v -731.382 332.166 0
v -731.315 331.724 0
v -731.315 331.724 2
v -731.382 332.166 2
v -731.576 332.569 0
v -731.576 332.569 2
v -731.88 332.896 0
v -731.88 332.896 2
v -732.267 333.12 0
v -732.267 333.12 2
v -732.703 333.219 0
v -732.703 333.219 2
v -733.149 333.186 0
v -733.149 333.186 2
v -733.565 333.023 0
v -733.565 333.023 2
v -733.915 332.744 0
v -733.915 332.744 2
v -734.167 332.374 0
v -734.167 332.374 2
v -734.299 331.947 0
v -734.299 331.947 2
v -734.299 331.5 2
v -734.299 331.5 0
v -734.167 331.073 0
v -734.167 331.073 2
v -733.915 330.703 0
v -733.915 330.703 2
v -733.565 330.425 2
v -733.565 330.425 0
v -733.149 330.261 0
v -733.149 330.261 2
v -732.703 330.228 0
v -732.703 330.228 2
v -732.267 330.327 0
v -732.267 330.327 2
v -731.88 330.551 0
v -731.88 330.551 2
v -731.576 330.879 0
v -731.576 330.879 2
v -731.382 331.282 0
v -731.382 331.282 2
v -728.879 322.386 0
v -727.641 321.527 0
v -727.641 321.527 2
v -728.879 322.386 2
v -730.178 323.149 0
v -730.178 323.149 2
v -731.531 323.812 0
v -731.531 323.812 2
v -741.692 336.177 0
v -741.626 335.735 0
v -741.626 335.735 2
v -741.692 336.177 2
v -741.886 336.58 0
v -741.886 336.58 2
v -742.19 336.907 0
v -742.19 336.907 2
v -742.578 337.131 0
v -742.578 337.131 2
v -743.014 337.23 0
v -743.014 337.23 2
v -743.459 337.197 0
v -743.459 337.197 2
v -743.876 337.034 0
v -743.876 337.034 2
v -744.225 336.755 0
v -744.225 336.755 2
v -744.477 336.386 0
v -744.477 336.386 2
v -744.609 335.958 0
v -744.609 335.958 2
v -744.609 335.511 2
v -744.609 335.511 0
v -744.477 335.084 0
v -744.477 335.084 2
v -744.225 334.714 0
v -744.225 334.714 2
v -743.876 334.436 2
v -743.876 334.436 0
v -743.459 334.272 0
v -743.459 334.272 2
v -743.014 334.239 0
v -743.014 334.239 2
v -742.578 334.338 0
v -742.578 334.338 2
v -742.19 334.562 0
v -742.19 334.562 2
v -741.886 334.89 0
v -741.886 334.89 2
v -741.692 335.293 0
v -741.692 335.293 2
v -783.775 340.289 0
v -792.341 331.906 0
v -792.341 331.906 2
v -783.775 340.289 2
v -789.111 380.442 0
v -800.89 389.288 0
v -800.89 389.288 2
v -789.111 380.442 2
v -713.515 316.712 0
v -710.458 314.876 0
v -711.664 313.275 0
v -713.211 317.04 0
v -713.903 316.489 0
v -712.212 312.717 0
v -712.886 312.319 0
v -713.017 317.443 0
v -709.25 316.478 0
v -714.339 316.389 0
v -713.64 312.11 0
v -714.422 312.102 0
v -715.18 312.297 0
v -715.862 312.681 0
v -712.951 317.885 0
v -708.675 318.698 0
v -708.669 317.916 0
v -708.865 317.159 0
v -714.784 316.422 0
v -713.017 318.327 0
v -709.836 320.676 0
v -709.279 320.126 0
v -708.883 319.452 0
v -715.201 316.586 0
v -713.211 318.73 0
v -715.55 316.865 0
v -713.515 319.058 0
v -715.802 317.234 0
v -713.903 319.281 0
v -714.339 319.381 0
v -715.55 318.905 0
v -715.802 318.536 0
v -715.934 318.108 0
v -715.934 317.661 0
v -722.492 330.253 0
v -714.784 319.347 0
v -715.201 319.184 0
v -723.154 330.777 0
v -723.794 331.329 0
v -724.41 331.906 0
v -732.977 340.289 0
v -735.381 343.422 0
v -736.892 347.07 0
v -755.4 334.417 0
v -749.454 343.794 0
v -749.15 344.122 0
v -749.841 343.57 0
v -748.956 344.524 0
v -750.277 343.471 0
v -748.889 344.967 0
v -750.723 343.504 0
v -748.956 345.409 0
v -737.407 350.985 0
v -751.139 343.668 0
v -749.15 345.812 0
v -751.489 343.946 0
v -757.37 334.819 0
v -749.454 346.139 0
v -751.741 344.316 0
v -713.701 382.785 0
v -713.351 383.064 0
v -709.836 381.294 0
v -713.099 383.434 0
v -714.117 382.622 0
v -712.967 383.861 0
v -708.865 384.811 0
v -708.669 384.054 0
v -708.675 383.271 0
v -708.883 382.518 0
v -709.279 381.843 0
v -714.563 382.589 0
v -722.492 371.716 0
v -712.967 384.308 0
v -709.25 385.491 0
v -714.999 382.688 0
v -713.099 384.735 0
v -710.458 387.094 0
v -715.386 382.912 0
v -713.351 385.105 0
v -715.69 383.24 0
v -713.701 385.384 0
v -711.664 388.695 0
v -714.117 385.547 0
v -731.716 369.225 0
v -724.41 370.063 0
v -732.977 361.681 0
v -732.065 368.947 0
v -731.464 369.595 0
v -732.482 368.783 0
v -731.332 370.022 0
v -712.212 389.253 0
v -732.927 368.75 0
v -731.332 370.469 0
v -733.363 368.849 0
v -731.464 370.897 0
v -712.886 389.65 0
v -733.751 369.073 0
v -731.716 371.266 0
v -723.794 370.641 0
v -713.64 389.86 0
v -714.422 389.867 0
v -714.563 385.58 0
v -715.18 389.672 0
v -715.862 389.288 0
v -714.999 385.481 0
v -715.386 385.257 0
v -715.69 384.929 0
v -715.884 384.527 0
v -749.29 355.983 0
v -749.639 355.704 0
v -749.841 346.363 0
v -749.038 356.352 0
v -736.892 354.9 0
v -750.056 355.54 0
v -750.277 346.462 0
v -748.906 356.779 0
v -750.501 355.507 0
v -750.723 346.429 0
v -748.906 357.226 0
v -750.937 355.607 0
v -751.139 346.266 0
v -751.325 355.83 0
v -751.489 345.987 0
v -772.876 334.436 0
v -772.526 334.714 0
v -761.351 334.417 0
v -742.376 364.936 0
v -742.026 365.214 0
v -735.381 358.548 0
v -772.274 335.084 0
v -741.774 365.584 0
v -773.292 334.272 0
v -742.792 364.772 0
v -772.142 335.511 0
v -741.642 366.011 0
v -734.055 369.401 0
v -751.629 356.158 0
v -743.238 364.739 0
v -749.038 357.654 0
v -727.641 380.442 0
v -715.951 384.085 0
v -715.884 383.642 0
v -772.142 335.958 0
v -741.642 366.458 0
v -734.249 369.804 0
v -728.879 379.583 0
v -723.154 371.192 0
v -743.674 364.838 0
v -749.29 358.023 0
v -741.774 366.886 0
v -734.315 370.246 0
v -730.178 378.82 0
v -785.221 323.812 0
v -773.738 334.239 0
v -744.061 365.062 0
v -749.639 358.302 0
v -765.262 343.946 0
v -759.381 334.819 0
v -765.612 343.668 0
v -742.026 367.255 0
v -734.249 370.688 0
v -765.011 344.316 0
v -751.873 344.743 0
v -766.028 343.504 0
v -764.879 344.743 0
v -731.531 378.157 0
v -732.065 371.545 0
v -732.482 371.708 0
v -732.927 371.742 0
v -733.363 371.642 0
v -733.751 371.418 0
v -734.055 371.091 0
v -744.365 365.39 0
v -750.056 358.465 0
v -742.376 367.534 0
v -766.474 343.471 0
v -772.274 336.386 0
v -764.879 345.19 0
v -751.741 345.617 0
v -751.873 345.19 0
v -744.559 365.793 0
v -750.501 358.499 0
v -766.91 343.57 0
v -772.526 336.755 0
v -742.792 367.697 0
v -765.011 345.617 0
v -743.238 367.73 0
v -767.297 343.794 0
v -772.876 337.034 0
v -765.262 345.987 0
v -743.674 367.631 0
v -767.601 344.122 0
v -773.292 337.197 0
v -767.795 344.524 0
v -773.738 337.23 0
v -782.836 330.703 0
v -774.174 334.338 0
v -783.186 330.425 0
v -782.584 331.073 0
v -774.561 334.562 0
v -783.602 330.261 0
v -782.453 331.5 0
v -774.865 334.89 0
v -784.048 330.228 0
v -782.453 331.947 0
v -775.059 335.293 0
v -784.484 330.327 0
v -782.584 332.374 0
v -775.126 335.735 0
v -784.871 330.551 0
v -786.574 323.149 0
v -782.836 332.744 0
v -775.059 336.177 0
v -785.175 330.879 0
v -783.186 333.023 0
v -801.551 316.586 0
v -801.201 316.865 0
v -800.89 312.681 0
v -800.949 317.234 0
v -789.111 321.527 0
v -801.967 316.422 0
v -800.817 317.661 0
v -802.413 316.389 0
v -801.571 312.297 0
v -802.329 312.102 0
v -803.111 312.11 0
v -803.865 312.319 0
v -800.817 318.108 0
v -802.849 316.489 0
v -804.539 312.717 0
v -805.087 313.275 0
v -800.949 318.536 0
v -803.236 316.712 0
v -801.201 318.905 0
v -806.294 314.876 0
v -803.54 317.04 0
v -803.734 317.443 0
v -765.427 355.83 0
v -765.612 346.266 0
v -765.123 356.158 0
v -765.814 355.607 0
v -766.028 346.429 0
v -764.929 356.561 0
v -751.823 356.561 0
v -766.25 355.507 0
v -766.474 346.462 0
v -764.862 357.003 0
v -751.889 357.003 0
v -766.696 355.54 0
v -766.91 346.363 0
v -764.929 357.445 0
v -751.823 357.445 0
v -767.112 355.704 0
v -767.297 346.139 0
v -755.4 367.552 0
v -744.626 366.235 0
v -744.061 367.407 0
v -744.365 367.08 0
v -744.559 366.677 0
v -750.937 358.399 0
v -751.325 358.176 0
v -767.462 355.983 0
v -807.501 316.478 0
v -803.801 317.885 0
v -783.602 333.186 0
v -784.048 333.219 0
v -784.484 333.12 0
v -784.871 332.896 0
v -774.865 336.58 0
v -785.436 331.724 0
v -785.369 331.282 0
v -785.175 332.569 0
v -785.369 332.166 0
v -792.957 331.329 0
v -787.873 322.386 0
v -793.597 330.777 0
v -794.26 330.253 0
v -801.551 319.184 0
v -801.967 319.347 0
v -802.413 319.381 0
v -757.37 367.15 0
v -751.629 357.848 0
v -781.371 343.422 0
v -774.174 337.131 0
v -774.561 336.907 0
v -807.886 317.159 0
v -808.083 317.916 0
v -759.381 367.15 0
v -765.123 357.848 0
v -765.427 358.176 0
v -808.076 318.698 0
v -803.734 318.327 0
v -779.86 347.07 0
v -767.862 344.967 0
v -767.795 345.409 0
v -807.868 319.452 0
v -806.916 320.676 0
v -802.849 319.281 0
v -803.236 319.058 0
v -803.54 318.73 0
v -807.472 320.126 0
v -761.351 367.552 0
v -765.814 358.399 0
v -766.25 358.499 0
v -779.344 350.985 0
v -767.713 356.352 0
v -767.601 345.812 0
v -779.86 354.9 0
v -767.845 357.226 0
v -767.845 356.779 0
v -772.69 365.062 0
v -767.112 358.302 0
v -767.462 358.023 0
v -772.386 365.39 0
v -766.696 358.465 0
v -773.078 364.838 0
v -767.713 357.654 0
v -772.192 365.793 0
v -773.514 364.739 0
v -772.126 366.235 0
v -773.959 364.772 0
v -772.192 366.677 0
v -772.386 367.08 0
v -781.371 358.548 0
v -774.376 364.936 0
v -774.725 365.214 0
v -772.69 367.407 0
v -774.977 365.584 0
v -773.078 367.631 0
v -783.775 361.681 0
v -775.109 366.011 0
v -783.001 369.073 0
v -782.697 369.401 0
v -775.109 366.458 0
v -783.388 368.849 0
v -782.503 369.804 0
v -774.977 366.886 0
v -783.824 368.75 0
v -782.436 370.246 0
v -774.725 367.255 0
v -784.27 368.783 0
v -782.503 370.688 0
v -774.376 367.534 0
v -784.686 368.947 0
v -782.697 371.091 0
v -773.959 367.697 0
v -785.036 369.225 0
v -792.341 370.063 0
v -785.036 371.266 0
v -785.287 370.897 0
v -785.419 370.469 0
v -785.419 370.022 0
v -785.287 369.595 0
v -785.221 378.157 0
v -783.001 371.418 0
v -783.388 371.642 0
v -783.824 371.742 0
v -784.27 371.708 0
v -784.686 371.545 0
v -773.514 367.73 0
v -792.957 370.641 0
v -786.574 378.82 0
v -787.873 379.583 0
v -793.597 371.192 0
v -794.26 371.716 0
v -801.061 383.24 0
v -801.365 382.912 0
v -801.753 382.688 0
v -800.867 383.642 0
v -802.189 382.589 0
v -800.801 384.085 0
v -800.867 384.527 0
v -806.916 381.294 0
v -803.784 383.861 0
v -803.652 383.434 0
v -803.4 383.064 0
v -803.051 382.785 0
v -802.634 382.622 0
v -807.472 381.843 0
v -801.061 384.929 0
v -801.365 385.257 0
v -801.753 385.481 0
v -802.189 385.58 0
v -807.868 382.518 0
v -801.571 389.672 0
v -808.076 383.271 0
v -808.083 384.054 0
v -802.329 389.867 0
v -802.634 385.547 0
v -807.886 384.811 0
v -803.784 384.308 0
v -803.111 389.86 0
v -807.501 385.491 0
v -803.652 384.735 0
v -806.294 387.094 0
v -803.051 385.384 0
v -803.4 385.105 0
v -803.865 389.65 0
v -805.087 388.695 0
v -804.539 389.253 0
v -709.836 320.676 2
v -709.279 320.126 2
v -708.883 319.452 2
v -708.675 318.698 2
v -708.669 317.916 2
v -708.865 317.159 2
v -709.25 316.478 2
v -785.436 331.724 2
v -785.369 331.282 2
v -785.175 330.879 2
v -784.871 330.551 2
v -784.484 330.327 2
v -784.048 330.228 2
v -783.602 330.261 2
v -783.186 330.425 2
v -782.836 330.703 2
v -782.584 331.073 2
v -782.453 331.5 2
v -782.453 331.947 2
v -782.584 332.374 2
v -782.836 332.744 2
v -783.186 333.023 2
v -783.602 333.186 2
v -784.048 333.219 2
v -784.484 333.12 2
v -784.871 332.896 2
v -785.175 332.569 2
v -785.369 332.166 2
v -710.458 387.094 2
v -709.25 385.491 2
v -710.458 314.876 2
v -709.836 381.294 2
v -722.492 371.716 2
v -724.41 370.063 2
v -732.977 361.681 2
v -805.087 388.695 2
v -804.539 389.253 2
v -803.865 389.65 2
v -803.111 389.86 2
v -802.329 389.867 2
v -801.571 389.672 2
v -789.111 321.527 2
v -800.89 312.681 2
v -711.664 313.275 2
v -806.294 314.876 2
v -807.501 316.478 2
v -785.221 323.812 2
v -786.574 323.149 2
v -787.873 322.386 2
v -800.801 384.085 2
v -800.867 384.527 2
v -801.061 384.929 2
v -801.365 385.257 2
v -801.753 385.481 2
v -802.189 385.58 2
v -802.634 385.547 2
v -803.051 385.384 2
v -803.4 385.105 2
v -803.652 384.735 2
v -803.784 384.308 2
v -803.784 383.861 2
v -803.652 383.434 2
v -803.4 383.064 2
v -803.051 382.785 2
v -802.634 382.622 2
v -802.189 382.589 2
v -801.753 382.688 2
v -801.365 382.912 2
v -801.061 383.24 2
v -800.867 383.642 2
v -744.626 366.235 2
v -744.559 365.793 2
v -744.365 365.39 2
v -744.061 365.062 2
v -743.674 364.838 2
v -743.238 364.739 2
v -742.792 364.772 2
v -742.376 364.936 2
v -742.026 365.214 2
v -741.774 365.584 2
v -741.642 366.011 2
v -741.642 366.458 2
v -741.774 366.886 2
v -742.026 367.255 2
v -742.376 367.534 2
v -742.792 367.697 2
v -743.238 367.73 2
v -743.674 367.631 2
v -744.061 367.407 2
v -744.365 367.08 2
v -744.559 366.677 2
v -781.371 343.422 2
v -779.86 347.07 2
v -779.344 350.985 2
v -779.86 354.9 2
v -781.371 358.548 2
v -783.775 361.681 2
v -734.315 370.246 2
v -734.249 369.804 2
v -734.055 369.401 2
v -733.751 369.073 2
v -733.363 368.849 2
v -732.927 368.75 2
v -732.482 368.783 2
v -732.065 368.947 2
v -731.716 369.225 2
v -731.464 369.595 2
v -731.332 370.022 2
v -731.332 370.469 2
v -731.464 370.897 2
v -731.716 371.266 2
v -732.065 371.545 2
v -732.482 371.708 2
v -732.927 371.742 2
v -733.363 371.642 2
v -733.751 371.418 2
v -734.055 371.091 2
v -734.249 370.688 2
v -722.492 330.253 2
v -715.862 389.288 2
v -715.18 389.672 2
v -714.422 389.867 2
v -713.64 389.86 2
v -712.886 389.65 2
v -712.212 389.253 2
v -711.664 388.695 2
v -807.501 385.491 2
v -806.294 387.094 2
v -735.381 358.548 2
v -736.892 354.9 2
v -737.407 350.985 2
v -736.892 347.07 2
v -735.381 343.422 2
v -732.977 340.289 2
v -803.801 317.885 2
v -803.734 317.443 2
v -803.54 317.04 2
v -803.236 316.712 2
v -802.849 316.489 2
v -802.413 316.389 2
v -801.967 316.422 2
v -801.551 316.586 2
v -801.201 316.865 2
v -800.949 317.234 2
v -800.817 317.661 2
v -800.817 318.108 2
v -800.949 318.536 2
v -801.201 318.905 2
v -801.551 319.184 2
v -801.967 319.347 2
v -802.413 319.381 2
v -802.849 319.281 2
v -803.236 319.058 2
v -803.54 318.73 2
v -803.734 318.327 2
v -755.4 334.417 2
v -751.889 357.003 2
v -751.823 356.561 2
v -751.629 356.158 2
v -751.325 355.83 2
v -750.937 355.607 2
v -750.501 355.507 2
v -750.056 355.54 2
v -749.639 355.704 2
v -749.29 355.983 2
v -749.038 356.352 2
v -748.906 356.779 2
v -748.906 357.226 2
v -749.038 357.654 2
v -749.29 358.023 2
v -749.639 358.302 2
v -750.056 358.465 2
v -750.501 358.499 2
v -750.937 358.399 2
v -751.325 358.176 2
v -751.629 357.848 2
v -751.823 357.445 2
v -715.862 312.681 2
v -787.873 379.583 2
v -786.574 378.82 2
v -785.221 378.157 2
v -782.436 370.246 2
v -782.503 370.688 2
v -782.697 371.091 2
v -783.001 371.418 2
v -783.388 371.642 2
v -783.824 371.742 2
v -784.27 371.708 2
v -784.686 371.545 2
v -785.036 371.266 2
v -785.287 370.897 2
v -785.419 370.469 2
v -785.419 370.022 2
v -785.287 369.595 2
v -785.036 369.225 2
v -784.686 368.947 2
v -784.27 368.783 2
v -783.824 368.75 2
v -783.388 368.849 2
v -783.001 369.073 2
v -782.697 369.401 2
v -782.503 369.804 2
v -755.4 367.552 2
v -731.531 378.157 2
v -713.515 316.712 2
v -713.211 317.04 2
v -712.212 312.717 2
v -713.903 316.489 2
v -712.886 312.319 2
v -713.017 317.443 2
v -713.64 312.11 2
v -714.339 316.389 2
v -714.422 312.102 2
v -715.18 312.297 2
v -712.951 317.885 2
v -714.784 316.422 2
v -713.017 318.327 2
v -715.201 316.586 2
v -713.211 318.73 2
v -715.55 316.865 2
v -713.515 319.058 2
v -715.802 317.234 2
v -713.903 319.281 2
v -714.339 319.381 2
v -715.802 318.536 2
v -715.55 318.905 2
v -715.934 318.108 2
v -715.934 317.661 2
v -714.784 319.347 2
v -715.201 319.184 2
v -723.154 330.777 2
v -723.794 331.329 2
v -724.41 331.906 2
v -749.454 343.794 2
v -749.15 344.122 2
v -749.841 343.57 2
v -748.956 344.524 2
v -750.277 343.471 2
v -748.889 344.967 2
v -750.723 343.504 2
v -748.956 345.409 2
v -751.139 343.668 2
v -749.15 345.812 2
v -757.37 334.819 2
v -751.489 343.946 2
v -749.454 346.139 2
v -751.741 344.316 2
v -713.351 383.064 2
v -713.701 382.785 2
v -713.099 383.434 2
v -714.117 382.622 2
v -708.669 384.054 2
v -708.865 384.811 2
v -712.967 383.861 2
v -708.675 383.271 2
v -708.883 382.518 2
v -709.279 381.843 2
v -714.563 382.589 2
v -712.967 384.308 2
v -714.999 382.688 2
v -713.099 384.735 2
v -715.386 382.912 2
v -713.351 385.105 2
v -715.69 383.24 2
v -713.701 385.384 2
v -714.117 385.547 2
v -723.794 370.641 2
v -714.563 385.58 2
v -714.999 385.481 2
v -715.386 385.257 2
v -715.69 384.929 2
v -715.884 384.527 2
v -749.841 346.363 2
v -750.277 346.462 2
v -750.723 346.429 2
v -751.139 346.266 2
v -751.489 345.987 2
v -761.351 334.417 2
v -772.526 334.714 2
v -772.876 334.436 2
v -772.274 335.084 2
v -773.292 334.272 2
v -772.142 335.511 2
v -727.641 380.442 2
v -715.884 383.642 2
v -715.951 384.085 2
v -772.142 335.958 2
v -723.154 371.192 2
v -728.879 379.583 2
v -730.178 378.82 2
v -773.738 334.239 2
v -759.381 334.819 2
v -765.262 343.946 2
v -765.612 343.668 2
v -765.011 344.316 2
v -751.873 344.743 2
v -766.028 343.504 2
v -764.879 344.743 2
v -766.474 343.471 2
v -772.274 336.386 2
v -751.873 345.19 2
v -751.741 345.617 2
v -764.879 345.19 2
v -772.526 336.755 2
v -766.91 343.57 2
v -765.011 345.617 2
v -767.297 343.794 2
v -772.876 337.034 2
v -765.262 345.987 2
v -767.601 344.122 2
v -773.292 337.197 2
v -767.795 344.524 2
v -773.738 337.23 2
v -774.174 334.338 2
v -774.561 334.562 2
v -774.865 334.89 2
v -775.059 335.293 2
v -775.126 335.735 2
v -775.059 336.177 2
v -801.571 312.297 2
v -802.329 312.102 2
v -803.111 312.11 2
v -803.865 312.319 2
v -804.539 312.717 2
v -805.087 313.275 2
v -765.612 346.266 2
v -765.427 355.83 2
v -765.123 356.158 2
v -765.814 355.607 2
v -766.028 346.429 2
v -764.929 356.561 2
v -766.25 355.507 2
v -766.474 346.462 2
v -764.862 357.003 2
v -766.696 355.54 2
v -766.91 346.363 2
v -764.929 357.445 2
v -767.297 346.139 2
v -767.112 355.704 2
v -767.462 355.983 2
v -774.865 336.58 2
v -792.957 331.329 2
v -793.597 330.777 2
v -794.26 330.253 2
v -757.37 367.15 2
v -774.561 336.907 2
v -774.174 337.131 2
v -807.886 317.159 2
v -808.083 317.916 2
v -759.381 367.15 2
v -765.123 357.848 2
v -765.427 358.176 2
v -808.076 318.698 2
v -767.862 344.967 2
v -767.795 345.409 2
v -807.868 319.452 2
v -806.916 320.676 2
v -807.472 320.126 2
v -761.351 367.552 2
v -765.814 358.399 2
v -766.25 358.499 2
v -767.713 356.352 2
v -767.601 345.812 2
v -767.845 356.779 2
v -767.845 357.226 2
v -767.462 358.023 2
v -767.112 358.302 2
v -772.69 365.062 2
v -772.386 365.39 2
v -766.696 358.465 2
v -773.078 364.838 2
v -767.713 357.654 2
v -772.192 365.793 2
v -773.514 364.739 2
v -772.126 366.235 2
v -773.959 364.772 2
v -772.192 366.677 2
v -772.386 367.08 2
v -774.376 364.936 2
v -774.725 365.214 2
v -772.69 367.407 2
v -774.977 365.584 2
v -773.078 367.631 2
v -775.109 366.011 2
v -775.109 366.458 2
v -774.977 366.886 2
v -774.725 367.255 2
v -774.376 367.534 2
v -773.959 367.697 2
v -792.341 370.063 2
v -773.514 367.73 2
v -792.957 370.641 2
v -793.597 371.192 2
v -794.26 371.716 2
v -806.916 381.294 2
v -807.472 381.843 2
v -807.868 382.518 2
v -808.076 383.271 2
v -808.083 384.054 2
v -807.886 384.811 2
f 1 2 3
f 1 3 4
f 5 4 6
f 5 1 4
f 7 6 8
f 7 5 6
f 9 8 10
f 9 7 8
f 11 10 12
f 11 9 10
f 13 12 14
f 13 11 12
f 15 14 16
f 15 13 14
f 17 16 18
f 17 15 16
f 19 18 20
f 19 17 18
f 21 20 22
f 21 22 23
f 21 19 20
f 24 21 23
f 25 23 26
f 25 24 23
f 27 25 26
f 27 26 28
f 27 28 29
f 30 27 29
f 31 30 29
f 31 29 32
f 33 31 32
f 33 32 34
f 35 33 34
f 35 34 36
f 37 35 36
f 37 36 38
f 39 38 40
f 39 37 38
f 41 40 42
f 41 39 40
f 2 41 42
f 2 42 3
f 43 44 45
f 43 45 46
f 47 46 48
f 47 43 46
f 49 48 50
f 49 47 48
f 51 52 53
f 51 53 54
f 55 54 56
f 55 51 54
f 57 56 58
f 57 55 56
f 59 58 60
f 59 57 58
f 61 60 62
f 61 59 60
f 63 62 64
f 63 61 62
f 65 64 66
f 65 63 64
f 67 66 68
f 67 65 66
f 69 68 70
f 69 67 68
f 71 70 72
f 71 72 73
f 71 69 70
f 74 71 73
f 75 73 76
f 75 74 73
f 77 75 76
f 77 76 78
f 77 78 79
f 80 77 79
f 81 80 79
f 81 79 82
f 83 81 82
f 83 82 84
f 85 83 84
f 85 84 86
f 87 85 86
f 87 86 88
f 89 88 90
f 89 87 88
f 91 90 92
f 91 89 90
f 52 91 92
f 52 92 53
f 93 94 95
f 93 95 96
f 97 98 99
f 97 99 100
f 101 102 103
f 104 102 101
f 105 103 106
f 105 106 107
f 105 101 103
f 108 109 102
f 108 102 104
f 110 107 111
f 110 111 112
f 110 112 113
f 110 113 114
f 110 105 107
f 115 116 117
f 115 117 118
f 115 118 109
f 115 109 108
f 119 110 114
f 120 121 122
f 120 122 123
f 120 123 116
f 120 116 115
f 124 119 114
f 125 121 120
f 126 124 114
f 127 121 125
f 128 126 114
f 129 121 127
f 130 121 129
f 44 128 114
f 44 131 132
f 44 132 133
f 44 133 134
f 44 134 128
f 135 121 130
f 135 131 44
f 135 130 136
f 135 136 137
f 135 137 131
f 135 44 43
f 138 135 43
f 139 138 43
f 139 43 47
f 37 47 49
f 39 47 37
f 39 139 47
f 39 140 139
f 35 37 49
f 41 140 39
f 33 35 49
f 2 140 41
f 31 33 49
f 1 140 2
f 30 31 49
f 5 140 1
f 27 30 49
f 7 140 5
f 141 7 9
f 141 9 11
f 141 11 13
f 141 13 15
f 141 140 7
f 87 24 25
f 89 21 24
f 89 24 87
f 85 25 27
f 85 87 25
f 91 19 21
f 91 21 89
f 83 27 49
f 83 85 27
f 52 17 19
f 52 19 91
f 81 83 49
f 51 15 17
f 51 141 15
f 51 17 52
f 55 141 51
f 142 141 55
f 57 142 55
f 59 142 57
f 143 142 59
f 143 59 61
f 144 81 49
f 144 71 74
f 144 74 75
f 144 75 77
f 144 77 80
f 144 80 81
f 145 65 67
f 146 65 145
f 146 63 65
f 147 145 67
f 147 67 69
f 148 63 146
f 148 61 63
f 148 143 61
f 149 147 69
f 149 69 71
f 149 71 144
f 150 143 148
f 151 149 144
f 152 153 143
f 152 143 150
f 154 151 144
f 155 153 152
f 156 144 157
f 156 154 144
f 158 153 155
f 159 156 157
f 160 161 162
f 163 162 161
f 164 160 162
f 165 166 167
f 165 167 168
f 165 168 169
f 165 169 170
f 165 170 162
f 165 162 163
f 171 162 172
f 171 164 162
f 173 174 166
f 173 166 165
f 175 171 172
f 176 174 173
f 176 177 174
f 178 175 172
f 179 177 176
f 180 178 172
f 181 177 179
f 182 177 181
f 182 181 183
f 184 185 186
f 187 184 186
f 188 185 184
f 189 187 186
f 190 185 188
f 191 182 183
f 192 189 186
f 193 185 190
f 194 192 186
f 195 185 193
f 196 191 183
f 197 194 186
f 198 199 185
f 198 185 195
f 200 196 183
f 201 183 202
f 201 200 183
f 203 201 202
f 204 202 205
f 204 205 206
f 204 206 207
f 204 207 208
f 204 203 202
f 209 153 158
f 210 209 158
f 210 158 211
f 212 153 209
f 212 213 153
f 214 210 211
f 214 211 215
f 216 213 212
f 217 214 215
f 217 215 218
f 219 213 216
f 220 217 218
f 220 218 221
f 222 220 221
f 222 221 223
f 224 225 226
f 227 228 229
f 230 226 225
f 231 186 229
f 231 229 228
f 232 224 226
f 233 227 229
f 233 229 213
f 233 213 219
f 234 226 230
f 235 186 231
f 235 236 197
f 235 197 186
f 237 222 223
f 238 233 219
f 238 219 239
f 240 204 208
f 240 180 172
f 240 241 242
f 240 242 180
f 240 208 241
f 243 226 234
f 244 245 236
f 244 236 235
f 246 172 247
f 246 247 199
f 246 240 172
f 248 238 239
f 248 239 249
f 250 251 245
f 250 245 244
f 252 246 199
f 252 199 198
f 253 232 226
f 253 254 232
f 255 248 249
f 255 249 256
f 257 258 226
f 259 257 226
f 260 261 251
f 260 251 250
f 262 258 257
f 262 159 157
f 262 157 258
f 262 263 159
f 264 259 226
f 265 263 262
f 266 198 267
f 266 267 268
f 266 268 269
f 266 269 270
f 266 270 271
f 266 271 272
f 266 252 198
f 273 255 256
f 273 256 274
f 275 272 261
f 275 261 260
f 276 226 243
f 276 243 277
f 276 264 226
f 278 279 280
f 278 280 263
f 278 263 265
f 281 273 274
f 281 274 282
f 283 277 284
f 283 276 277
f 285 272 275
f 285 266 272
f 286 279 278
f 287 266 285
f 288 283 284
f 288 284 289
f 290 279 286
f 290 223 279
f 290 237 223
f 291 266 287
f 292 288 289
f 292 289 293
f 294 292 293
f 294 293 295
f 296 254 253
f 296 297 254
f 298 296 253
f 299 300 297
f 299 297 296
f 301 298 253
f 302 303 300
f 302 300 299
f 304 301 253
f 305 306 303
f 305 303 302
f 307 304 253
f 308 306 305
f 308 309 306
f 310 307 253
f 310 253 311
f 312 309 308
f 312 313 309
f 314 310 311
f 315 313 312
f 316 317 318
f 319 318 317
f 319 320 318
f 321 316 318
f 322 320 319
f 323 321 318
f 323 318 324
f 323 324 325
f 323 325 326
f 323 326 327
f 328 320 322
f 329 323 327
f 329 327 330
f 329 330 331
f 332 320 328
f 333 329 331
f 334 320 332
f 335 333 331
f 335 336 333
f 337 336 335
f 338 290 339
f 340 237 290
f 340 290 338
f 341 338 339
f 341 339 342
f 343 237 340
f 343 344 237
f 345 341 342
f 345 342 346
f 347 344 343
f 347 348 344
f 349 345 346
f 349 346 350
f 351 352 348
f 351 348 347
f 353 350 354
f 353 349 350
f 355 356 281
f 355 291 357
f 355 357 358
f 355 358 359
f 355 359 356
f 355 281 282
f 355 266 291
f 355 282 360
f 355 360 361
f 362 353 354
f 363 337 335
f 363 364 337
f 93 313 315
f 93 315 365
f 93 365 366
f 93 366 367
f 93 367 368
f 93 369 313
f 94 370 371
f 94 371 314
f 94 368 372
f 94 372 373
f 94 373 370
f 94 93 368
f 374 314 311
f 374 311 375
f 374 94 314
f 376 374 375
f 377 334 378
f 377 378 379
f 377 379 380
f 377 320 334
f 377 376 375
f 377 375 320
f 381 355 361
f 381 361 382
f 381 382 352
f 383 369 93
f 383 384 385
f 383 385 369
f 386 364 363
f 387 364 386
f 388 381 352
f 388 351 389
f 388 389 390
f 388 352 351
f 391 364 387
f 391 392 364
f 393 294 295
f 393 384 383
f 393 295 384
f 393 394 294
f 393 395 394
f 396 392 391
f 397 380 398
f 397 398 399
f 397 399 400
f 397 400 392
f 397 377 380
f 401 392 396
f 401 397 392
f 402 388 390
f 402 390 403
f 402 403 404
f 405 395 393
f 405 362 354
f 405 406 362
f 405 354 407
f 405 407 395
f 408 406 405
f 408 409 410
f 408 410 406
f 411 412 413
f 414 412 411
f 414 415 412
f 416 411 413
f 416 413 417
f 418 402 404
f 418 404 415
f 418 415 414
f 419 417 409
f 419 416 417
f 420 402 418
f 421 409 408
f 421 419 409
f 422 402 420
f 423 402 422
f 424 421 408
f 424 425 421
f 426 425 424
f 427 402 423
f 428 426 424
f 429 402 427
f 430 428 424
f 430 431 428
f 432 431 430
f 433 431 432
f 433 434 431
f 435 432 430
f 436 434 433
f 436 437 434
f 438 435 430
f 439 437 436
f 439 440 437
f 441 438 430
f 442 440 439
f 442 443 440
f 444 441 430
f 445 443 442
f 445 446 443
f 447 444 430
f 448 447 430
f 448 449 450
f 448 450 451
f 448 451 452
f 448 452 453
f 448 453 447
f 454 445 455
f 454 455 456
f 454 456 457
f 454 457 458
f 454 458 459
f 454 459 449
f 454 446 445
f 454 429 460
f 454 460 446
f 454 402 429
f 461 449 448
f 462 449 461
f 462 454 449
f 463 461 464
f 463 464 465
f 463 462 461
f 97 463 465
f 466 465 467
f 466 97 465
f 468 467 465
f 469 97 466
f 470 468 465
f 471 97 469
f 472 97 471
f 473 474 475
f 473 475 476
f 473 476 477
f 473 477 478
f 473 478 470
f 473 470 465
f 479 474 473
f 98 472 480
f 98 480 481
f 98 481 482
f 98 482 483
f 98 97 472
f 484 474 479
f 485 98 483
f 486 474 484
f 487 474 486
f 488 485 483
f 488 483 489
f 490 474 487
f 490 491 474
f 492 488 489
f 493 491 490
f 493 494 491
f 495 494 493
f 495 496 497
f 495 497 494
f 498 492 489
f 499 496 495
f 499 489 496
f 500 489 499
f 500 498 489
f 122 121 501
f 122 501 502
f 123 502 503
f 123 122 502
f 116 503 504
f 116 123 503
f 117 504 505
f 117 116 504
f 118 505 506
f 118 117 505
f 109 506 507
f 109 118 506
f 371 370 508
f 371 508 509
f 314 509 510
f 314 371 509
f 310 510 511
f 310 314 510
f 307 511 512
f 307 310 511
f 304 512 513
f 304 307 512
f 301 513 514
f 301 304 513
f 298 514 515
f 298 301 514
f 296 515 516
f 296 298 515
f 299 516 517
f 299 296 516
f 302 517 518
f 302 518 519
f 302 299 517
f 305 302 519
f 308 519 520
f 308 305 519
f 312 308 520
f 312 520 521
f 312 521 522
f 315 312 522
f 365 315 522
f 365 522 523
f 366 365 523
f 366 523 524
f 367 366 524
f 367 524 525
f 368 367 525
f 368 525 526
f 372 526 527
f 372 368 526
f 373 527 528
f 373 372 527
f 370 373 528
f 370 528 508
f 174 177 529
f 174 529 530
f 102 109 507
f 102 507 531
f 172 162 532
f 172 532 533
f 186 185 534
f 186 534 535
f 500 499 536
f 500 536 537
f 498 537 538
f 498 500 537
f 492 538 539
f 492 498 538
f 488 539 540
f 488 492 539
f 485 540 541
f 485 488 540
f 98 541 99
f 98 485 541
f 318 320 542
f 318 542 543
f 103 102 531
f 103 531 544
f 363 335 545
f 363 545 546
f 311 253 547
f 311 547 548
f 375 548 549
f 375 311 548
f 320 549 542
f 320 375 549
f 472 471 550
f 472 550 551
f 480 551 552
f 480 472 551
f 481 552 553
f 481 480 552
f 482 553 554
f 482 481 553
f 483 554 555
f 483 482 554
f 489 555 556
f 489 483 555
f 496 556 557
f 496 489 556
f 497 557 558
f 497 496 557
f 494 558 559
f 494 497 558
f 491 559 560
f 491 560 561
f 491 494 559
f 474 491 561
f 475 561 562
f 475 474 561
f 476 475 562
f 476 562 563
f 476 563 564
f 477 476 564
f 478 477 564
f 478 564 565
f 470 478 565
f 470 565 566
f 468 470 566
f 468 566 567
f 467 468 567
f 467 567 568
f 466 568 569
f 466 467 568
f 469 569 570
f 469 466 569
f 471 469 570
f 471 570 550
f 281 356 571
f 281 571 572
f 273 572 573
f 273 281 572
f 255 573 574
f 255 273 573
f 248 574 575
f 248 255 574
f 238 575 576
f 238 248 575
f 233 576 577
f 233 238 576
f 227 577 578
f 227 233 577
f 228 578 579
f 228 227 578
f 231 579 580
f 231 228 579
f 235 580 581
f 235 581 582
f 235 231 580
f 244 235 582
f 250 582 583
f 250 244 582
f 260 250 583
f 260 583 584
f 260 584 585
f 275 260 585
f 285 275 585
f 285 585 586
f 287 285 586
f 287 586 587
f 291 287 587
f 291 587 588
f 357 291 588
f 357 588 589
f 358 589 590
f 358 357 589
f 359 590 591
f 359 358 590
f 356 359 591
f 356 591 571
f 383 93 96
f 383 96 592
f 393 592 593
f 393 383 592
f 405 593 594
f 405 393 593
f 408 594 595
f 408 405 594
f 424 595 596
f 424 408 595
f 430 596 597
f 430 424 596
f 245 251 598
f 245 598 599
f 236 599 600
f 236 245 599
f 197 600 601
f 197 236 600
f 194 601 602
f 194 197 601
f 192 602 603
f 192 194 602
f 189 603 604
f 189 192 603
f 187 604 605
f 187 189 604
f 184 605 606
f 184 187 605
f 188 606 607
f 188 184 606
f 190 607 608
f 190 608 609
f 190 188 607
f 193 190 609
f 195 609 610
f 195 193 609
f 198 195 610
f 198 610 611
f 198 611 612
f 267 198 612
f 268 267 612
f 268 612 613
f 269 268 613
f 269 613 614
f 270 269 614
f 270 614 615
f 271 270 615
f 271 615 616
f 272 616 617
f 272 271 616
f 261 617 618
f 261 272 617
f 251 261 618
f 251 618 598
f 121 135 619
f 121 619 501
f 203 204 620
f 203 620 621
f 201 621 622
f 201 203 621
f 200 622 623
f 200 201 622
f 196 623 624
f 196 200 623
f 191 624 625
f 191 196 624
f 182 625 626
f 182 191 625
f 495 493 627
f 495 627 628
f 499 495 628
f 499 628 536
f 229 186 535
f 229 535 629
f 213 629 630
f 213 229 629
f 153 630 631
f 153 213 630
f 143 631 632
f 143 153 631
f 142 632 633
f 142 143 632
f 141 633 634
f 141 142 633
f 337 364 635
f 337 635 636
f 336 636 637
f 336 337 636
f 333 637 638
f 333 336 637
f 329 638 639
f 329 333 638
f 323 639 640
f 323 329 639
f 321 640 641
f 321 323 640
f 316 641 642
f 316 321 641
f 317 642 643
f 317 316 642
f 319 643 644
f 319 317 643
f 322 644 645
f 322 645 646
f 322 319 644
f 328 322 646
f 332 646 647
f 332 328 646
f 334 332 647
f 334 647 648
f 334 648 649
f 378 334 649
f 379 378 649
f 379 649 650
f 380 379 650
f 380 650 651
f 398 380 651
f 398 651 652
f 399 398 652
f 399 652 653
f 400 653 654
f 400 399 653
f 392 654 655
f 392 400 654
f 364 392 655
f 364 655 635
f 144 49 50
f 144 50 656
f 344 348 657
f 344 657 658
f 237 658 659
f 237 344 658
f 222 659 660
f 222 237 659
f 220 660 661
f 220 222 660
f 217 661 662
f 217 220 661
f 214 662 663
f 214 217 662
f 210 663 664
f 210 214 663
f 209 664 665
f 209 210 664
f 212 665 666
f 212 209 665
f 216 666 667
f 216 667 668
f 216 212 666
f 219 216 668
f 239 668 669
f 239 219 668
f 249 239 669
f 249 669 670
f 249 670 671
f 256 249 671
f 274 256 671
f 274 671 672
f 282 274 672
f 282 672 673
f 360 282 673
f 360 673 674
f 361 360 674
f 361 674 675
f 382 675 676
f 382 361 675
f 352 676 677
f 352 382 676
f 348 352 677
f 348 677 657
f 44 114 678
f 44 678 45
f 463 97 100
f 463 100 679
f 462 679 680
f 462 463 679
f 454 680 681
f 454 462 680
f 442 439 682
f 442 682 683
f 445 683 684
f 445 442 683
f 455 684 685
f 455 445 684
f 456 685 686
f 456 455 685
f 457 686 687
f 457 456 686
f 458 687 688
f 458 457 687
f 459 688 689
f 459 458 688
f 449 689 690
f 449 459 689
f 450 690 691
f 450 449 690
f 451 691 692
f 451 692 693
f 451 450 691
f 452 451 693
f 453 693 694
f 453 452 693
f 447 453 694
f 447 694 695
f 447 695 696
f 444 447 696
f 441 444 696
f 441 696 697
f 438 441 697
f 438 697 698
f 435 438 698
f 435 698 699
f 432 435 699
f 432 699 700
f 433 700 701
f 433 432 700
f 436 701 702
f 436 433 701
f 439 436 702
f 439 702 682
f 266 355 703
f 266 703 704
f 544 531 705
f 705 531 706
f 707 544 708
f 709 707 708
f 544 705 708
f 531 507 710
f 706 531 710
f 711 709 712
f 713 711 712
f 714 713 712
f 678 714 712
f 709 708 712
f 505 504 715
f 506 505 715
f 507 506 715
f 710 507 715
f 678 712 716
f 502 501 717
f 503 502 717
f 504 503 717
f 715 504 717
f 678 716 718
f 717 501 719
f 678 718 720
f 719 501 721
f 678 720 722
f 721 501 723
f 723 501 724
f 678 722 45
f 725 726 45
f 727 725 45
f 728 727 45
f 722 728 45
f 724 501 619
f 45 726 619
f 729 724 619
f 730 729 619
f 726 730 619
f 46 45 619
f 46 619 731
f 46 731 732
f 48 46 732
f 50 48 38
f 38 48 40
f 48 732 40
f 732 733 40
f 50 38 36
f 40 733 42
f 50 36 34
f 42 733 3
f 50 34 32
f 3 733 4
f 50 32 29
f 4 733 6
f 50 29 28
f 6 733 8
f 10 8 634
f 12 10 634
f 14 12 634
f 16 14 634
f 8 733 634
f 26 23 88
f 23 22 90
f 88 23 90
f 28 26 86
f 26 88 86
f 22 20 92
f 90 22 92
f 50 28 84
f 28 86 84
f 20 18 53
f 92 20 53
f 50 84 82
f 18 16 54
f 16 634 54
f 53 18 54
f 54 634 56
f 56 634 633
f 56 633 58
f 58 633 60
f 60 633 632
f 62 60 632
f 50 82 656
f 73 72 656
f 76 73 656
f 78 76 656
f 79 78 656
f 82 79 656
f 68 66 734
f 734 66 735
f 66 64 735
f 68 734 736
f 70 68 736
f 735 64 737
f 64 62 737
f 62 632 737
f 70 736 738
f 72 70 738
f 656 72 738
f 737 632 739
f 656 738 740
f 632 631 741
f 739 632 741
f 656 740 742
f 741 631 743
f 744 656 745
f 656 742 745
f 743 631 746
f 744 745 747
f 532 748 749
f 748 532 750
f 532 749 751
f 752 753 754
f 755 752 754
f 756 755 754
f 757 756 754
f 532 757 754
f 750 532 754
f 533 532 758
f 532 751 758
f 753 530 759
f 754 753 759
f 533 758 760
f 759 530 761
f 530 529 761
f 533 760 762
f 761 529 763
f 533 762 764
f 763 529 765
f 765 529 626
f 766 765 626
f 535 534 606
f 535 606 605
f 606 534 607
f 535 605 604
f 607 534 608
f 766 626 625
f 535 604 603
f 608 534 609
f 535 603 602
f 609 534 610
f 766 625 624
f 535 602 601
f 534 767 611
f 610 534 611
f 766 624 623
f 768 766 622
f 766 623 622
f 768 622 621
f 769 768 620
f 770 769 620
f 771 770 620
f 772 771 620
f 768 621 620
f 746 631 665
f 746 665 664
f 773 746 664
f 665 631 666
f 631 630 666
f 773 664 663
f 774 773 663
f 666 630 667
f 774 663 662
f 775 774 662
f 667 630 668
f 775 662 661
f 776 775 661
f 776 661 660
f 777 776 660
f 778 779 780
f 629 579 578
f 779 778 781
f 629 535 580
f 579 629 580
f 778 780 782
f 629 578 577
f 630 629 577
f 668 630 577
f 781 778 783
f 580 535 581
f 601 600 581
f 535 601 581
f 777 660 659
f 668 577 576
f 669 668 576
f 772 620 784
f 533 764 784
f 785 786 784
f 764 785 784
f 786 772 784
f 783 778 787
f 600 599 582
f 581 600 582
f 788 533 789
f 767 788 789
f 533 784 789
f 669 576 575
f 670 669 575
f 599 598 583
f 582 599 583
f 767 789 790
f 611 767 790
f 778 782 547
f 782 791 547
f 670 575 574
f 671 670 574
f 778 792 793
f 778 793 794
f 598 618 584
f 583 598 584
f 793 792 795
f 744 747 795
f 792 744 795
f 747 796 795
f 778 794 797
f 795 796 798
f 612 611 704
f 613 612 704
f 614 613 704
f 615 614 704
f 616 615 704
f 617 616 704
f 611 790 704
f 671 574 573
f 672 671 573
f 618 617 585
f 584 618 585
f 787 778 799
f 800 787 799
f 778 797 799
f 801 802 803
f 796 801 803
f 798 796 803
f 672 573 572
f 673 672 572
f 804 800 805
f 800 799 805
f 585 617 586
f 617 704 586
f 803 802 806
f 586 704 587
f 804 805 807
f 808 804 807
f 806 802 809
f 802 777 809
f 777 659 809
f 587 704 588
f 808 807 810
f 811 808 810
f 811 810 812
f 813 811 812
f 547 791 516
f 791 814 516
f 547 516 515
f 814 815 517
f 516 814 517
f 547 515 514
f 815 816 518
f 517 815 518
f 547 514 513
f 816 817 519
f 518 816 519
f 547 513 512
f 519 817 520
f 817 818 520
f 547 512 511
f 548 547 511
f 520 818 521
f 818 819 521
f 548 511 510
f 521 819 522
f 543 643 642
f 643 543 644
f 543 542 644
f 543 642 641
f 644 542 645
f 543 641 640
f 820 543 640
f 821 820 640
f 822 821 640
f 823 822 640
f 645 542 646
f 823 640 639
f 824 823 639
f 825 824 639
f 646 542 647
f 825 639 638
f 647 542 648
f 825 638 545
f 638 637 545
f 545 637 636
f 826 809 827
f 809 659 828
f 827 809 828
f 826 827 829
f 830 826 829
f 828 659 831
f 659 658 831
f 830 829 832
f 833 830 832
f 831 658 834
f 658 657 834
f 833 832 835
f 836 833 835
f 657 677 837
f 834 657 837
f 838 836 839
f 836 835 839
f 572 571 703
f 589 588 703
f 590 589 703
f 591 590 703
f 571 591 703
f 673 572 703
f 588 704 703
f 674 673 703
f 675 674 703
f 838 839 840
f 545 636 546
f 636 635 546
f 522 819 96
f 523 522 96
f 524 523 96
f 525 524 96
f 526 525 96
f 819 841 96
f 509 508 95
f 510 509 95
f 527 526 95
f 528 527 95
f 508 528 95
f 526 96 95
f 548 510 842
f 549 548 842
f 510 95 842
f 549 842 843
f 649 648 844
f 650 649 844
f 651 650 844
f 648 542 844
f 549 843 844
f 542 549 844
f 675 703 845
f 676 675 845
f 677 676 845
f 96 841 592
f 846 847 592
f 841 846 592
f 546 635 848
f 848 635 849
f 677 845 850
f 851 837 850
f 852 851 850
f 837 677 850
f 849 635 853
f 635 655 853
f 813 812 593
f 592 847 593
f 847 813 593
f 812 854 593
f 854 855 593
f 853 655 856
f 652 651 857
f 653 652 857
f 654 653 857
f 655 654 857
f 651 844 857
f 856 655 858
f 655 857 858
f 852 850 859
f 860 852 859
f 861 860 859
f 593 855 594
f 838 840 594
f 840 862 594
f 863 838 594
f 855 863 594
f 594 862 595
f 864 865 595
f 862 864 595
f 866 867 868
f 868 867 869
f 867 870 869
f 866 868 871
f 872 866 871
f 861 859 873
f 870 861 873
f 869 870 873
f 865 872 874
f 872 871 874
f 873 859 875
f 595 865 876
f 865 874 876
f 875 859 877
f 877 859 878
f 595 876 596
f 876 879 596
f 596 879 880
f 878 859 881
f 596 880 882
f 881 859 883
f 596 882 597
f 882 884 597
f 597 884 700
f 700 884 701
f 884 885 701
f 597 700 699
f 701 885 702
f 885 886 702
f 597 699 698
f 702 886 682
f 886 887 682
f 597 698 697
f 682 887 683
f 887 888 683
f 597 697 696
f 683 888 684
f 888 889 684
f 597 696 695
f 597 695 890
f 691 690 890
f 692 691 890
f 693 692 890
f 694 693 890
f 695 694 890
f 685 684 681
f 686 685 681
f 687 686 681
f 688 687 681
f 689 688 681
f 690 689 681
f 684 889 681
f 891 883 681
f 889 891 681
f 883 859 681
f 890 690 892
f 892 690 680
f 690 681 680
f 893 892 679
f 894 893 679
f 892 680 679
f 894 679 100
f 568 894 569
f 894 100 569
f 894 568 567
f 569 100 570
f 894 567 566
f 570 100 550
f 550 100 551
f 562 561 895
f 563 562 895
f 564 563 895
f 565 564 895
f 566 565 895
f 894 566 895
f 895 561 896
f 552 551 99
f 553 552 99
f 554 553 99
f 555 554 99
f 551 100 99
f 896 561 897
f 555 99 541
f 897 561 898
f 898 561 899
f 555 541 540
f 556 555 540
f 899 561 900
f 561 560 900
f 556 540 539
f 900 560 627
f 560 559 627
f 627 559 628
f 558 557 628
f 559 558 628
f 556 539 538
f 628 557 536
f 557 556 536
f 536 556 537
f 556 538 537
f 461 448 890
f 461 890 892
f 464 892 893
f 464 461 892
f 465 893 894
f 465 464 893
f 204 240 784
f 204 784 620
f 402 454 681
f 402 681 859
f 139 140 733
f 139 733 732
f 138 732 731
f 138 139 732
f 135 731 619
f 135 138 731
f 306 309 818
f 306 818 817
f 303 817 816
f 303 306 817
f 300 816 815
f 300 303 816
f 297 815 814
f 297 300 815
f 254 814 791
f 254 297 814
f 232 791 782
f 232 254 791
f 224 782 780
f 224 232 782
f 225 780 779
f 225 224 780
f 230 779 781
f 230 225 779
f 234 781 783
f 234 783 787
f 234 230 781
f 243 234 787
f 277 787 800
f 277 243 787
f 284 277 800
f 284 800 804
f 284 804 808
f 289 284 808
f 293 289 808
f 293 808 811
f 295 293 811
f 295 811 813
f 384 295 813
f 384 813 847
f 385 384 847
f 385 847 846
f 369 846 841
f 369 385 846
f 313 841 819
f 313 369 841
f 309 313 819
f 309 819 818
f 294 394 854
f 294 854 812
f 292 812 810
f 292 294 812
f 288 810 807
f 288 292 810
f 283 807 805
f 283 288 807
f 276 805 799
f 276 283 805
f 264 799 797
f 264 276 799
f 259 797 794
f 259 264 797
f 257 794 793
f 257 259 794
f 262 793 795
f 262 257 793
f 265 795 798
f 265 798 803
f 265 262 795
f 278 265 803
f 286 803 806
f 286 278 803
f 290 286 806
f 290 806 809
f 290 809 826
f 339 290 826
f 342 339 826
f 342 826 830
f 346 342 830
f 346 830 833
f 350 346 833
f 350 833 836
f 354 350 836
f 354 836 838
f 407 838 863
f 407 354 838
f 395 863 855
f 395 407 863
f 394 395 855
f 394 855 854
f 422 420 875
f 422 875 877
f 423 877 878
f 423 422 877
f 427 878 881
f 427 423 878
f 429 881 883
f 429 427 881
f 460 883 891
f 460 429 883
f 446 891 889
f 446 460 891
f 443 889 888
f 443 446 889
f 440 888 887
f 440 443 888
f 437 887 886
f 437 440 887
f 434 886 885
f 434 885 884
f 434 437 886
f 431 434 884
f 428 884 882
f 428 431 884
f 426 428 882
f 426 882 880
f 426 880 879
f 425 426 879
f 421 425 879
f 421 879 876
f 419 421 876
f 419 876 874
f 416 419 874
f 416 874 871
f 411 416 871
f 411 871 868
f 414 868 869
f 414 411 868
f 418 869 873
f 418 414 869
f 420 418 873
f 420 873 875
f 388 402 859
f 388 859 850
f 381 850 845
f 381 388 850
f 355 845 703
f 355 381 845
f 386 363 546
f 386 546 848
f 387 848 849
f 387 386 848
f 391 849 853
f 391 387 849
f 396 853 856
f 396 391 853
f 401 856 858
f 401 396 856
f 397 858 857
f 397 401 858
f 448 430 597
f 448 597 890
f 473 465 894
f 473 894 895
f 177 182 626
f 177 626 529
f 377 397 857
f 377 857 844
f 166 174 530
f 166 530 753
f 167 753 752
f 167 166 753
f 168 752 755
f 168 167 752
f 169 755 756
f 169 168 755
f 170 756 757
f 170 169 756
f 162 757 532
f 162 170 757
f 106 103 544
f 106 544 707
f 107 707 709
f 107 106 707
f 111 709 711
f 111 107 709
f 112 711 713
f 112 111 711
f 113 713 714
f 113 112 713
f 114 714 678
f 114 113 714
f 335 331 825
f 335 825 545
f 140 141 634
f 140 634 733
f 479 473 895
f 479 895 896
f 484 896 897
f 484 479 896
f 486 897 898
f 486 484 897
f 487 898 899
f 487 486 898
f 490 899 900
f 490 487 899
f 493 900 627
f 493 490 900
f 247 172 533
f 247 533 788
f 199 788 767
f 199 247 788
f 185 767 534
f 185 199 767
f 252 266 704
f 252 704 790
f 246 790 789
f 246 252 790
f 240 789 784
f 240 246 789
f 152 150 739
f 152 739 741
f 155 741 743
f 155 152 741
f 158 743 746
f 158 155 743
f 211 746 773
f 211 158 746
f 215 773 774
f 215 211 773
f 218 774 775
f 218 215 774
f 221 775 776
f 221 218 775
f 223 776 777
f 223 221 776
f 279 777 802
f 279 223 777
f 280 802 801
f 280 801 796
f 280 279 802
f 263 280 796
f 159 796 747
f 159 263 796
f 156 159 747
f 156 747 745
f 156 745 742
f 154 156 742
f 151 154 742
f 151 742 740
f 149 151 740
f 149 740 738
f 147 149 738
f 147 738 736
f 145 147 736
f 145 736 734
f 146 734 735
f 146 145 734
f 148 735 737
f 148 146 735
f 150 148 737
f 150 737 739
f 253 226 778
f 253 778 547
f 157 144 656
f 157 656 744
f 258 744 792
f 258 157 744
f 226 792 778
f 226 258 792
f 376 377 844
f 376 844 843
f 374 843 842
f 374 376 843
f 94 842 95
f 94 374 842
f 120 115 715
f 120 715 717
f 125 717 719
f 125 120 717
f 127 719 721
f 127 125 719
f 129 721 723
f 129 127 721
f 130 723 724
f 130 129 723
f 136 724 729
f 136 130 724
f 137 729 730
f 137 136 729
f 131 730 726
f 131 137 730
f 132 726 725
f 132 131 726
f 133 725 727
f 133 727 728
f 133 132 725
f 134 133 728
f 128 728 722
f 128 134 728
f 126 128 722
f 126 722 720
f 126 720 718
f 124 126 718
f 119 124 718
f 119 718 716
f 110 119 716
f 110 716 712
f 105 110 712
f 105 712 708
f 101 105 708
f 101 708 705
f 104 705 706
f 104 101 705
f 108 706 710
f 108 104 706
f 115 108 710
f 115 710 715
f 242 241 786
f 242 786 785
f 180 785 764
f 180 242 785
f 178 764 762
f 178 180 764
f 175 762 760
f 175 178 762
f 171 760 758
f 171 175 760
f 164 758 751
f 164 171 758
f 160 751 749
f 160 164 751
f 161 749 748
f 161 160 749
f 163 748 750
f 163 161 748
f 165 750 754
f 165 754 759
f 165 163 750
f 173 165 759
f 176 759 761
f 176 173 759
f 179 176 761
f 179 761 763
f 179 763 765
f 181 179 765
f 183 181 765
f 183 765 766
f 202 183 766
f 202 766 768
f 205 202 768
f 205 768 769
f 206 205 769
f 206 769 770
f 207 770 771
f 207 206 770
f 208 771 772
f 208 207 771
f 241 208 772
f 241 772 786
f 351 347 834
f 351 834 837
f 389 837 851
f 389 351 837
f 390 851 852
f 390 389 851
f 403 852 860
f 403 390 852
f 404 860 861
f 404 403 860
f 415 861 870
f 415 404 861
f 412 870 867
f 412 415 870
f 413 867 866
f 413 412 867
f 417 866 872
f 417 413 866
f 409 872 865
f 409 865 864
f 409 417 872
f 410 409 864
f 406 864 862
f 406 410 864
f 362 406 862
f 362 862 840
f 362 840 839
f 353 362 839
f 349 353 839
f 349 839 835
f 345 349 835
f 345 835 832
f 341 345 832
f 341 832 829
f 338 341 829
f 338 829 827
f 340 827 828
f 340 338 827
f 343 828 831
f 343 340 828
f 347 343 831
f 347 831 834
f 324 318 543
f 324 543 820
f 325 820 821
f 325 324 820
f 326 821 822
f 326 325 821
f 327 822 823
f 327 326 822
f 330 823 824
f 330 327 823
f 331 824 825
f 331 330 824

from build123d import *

# Parameters (mm, degrees)
CROQUIS1_R              = 1.5
SALIENTE_EXTRUIR1_DEPTH = 2


with BuildPart() as part:
    # Croquis1 → Saliente-Extruir1 (new body)
    with BuildSketch(Plane.XY):
        with BuildLine():
            Line((-806.293781222, 387.093592203), (-805.087201617, 388.694777419))
            ThreePointArc((-805.087201617, 388.694777419), (-803.111242937, 389.859794234), (-800.889769824, 389.288187645))
            Line((-800.889769824, 389.288187645), (-789.110634699, 380.442131133))
            ThreePointArc((-789.110634699, 380.442131133), (-787.230269134, 379.189584745), (-785.220630898, 378.157111371))
            Line((-785.220630898, 378.157111371), (-761.350873045, 367.552403578))
            ThreePointArc((-761.350873045, 367.552403578), (-758.375650619, 367.099552447), (-755.400428194, 367.552403578))
            Line((-755.400428194, 367.552403578), (-731.530670341, 378.157111371))
            ThreePointArc((-731.530670341, 378.157111371), (-729.521032104, 379.189584745), (-727.640666539, 380.442131133))
            Line((-727.640666539, 380.442131133), (-715.861531414, 389.288187645))
            ThreePointArc((-715.861531414, 389.288187645), (-713.640058301, 389.859794234), (-711.664099621, 388.694777419))
            Line((-711.664099621, 388.694777419), (-710.457520016, 387.093592203))
            Line((-710.457520016, 387.093592203), (-709.250181935, 385.491400454))
            ThreePointArc((-709.250181935, 385.491400454), (-708.674856636, 383.271490166), (-709.835721429, 381.293765761))
            Line((-709.835721429, 381.293765761), (-722.491711895, 371.715934755))
            ThreePointArc((-722.491711895, 371.715934755), (-723.477203121, 370.919812191), (-724.410312611, 370.062892842))
            Line((-724.410312611, 370.062892842), (-732.976662667, 361.68062014))
            ThreePointArc((-732.976662667, 361.68062014), (-737.407061656, 350.984690814), (-732.976662667, 340.288761488))
            Line((-732.976662667, 340.288761488), (-724.410312611, 331.906488787))
            ThreePointArc((-724.410312611, 331.906488787), (-723.477203121, 331.049569437), (-722.491711895, 330.253446873))
            Line((-722.491711895, 330.253446873), (-709.835721429, 320.675615867))
            ThreePointArc((-709.835721429, 320.675615867), (-708.674856636, 318.697891463), (-709.250181935, 316.477981174))
            Line((-709.250181935, 316.477981174), (-710.457520016, 314.875789425))
            Line((-710.457520016, 314.875789425), (-711.664099621, 313.274604209))
            ThreePointArc((-711.664099621, 313.274604209), (-713.640058301, 312.109587395), (-715.861531414, 312.681193984))
            Line((-715.861531414, 312.681193984), (-727.640666539, 321.527250495))
            ThreePointArc((-727.640666539, 321.527250495), (-729.521032104, 322.779796883), (-731.530670341, 323.812270257))
            Line((-731.530670341, 323.812270257), (-755.400428194, 334.41697805))
            ThreePointArc((-755.400428194, 334.41697805), (-758.375650619, 334.869829182), (-761.350873045, 334.41697805))
            Line((-761.350873045, 334.41697805), (-785.220630898, 323.812270257))
            ThreePointArc((-785.220630898, 323.812270257), (-787.230269134, 322.779796883), (-789.110634699, 321.527250495))
            Line((-789.110634699, 321.527250495), (-800.889769824, 312.681193984))
            ThreePointArc((-800.889769824, 312.681193984), (-803.111242937, 312.109587395), (-805.087201617, 313.274604209))
            Line((-805.087201617, 313.274604209), (-806.293781222, 314.875789425))
            Line((-806.293781222, 314.875789425), (-807.501119304, 316.477981174))
            ThreePointArc((-807.501119304, 316.477981174), (-808.076444603, 318.697891463), (-806.915579809, 320.675615867))
            Line((-806.915579809, 320.675615867), (-794.259589343, 330.253446873))
            ThreePointArc((-794.259589343, 330.253446873), (-793.274098117, 331.049569437), (-792.340988627, 331.906488787))
            Line((-792.340988627, 331.906488787), (-783.774638572, 340.288761488))
            ThreePointArc((-783.774638572, 340.288761488), (-779.344239583, 350.984690814), (-783.774638572, 361.68062014))
            Line((-783.774638572, 361.68062014), (-792.340988627, 370.062892842))
            ThreePointArc((-792.340988627, 370.062892842), (-793.274098117, 370.919812191), (-794.259589343, 371.715934755))
            Line((-794.259589343, 371.715934755), (-806.915579809, 381.293765761))
            ThreePointArc((-806.915579809, 381.293765761), (-808.076444603, 383.271490166), (-807.501119304, 385.491400454))
            Line((-807.501119304, 385.491400454), (-806.293781222, 387.093592203))
        make_face()
        with Locations((-802.300603672, 384.084517088)):
            Circle(CROQUIS1_R, mode=Mode.SUBTRACT)
        with Locations((-783.935934024, 370.245745896)):
            Circle(CROQUIS1_R, mode=Mode.SUBTRACT)
        with Locations((-766.36200572, 357.002841046)):
            Circle(CROQUIS1_R, mode=Mode.SUBTRACT)
        with Locations((-773.625650619, 366.234690814)):
            Circle(CROQUIS1_R, mode=Mode.SUBTRACT)
        with Locations(Location((-750.389295519, 357.002841046, 0), (0, 0, 180))):
            Circle(CROQUIS1_R, mode=Mode.SUBTRACT)
        with Locations(Location((-743.125650619, 366.234690814, 0), (0, 0, 180))):
            Circle(CROQUIS1_R, mode=Mode.SUBTRACT)
        with Locations(Location((-732.815367214, 370.245745896, 0), (0, 0, 180))):
            Circle(CROQUIS1_R, mode=Mode.SUBTRACT)
        with Locations(Location((-714.450697566, 384.084517088, 0), (0, 0, 180))):
            Circle(CROQUIS1_R, mode=Mode.SUBTRACT)
        with Locations((-714.450697566, 317.884864541)):
            Circle(CROQUIS1_R, mode=Mode.SUBTRACT)
        with Locations((-732.815367214, 331.723635733)):
            Circle(CROQUIS1_R, mode=Mode.SUBTRACT)
        with Locations((-743.125650619, 335.734690814)):
            Circle(CROQUIS1_R, mode=Mode.SUBTRACT)
        with Locations((-750.389295519, 344.966540583)):
            Circle(CROQUIS1_R, mode=Mode.SUBTRACT)
        with Locations(Location((-766.36200572, 344.966540583, 0), (0, 0, 180))):
            Circle(CROQUIS1_R, mode=Mode.SUBTRACT)
        with Locations(Location((-773.625650619, 335.734690814, 0), (0, 0, 180))):
            Circle(CROQUIS1_R, mode=Mode.SUBTRACT)
        with Locations(Location((-783.935934024, 331.723635733, 0), (0, 0, 180))):
            Circle(CROQUIS1_R, mode=Mode.SUBTRACT)
        with Locations(Location((-802.300603672, 317.884864541, 0), (0, 0, 180))):
            Circle(CROQUIS1_R, mode=Mode.SUBTRACT)
    extrude(amount=SALIENTE_EXTRUIR1_DEPTH)


solid = part.part
